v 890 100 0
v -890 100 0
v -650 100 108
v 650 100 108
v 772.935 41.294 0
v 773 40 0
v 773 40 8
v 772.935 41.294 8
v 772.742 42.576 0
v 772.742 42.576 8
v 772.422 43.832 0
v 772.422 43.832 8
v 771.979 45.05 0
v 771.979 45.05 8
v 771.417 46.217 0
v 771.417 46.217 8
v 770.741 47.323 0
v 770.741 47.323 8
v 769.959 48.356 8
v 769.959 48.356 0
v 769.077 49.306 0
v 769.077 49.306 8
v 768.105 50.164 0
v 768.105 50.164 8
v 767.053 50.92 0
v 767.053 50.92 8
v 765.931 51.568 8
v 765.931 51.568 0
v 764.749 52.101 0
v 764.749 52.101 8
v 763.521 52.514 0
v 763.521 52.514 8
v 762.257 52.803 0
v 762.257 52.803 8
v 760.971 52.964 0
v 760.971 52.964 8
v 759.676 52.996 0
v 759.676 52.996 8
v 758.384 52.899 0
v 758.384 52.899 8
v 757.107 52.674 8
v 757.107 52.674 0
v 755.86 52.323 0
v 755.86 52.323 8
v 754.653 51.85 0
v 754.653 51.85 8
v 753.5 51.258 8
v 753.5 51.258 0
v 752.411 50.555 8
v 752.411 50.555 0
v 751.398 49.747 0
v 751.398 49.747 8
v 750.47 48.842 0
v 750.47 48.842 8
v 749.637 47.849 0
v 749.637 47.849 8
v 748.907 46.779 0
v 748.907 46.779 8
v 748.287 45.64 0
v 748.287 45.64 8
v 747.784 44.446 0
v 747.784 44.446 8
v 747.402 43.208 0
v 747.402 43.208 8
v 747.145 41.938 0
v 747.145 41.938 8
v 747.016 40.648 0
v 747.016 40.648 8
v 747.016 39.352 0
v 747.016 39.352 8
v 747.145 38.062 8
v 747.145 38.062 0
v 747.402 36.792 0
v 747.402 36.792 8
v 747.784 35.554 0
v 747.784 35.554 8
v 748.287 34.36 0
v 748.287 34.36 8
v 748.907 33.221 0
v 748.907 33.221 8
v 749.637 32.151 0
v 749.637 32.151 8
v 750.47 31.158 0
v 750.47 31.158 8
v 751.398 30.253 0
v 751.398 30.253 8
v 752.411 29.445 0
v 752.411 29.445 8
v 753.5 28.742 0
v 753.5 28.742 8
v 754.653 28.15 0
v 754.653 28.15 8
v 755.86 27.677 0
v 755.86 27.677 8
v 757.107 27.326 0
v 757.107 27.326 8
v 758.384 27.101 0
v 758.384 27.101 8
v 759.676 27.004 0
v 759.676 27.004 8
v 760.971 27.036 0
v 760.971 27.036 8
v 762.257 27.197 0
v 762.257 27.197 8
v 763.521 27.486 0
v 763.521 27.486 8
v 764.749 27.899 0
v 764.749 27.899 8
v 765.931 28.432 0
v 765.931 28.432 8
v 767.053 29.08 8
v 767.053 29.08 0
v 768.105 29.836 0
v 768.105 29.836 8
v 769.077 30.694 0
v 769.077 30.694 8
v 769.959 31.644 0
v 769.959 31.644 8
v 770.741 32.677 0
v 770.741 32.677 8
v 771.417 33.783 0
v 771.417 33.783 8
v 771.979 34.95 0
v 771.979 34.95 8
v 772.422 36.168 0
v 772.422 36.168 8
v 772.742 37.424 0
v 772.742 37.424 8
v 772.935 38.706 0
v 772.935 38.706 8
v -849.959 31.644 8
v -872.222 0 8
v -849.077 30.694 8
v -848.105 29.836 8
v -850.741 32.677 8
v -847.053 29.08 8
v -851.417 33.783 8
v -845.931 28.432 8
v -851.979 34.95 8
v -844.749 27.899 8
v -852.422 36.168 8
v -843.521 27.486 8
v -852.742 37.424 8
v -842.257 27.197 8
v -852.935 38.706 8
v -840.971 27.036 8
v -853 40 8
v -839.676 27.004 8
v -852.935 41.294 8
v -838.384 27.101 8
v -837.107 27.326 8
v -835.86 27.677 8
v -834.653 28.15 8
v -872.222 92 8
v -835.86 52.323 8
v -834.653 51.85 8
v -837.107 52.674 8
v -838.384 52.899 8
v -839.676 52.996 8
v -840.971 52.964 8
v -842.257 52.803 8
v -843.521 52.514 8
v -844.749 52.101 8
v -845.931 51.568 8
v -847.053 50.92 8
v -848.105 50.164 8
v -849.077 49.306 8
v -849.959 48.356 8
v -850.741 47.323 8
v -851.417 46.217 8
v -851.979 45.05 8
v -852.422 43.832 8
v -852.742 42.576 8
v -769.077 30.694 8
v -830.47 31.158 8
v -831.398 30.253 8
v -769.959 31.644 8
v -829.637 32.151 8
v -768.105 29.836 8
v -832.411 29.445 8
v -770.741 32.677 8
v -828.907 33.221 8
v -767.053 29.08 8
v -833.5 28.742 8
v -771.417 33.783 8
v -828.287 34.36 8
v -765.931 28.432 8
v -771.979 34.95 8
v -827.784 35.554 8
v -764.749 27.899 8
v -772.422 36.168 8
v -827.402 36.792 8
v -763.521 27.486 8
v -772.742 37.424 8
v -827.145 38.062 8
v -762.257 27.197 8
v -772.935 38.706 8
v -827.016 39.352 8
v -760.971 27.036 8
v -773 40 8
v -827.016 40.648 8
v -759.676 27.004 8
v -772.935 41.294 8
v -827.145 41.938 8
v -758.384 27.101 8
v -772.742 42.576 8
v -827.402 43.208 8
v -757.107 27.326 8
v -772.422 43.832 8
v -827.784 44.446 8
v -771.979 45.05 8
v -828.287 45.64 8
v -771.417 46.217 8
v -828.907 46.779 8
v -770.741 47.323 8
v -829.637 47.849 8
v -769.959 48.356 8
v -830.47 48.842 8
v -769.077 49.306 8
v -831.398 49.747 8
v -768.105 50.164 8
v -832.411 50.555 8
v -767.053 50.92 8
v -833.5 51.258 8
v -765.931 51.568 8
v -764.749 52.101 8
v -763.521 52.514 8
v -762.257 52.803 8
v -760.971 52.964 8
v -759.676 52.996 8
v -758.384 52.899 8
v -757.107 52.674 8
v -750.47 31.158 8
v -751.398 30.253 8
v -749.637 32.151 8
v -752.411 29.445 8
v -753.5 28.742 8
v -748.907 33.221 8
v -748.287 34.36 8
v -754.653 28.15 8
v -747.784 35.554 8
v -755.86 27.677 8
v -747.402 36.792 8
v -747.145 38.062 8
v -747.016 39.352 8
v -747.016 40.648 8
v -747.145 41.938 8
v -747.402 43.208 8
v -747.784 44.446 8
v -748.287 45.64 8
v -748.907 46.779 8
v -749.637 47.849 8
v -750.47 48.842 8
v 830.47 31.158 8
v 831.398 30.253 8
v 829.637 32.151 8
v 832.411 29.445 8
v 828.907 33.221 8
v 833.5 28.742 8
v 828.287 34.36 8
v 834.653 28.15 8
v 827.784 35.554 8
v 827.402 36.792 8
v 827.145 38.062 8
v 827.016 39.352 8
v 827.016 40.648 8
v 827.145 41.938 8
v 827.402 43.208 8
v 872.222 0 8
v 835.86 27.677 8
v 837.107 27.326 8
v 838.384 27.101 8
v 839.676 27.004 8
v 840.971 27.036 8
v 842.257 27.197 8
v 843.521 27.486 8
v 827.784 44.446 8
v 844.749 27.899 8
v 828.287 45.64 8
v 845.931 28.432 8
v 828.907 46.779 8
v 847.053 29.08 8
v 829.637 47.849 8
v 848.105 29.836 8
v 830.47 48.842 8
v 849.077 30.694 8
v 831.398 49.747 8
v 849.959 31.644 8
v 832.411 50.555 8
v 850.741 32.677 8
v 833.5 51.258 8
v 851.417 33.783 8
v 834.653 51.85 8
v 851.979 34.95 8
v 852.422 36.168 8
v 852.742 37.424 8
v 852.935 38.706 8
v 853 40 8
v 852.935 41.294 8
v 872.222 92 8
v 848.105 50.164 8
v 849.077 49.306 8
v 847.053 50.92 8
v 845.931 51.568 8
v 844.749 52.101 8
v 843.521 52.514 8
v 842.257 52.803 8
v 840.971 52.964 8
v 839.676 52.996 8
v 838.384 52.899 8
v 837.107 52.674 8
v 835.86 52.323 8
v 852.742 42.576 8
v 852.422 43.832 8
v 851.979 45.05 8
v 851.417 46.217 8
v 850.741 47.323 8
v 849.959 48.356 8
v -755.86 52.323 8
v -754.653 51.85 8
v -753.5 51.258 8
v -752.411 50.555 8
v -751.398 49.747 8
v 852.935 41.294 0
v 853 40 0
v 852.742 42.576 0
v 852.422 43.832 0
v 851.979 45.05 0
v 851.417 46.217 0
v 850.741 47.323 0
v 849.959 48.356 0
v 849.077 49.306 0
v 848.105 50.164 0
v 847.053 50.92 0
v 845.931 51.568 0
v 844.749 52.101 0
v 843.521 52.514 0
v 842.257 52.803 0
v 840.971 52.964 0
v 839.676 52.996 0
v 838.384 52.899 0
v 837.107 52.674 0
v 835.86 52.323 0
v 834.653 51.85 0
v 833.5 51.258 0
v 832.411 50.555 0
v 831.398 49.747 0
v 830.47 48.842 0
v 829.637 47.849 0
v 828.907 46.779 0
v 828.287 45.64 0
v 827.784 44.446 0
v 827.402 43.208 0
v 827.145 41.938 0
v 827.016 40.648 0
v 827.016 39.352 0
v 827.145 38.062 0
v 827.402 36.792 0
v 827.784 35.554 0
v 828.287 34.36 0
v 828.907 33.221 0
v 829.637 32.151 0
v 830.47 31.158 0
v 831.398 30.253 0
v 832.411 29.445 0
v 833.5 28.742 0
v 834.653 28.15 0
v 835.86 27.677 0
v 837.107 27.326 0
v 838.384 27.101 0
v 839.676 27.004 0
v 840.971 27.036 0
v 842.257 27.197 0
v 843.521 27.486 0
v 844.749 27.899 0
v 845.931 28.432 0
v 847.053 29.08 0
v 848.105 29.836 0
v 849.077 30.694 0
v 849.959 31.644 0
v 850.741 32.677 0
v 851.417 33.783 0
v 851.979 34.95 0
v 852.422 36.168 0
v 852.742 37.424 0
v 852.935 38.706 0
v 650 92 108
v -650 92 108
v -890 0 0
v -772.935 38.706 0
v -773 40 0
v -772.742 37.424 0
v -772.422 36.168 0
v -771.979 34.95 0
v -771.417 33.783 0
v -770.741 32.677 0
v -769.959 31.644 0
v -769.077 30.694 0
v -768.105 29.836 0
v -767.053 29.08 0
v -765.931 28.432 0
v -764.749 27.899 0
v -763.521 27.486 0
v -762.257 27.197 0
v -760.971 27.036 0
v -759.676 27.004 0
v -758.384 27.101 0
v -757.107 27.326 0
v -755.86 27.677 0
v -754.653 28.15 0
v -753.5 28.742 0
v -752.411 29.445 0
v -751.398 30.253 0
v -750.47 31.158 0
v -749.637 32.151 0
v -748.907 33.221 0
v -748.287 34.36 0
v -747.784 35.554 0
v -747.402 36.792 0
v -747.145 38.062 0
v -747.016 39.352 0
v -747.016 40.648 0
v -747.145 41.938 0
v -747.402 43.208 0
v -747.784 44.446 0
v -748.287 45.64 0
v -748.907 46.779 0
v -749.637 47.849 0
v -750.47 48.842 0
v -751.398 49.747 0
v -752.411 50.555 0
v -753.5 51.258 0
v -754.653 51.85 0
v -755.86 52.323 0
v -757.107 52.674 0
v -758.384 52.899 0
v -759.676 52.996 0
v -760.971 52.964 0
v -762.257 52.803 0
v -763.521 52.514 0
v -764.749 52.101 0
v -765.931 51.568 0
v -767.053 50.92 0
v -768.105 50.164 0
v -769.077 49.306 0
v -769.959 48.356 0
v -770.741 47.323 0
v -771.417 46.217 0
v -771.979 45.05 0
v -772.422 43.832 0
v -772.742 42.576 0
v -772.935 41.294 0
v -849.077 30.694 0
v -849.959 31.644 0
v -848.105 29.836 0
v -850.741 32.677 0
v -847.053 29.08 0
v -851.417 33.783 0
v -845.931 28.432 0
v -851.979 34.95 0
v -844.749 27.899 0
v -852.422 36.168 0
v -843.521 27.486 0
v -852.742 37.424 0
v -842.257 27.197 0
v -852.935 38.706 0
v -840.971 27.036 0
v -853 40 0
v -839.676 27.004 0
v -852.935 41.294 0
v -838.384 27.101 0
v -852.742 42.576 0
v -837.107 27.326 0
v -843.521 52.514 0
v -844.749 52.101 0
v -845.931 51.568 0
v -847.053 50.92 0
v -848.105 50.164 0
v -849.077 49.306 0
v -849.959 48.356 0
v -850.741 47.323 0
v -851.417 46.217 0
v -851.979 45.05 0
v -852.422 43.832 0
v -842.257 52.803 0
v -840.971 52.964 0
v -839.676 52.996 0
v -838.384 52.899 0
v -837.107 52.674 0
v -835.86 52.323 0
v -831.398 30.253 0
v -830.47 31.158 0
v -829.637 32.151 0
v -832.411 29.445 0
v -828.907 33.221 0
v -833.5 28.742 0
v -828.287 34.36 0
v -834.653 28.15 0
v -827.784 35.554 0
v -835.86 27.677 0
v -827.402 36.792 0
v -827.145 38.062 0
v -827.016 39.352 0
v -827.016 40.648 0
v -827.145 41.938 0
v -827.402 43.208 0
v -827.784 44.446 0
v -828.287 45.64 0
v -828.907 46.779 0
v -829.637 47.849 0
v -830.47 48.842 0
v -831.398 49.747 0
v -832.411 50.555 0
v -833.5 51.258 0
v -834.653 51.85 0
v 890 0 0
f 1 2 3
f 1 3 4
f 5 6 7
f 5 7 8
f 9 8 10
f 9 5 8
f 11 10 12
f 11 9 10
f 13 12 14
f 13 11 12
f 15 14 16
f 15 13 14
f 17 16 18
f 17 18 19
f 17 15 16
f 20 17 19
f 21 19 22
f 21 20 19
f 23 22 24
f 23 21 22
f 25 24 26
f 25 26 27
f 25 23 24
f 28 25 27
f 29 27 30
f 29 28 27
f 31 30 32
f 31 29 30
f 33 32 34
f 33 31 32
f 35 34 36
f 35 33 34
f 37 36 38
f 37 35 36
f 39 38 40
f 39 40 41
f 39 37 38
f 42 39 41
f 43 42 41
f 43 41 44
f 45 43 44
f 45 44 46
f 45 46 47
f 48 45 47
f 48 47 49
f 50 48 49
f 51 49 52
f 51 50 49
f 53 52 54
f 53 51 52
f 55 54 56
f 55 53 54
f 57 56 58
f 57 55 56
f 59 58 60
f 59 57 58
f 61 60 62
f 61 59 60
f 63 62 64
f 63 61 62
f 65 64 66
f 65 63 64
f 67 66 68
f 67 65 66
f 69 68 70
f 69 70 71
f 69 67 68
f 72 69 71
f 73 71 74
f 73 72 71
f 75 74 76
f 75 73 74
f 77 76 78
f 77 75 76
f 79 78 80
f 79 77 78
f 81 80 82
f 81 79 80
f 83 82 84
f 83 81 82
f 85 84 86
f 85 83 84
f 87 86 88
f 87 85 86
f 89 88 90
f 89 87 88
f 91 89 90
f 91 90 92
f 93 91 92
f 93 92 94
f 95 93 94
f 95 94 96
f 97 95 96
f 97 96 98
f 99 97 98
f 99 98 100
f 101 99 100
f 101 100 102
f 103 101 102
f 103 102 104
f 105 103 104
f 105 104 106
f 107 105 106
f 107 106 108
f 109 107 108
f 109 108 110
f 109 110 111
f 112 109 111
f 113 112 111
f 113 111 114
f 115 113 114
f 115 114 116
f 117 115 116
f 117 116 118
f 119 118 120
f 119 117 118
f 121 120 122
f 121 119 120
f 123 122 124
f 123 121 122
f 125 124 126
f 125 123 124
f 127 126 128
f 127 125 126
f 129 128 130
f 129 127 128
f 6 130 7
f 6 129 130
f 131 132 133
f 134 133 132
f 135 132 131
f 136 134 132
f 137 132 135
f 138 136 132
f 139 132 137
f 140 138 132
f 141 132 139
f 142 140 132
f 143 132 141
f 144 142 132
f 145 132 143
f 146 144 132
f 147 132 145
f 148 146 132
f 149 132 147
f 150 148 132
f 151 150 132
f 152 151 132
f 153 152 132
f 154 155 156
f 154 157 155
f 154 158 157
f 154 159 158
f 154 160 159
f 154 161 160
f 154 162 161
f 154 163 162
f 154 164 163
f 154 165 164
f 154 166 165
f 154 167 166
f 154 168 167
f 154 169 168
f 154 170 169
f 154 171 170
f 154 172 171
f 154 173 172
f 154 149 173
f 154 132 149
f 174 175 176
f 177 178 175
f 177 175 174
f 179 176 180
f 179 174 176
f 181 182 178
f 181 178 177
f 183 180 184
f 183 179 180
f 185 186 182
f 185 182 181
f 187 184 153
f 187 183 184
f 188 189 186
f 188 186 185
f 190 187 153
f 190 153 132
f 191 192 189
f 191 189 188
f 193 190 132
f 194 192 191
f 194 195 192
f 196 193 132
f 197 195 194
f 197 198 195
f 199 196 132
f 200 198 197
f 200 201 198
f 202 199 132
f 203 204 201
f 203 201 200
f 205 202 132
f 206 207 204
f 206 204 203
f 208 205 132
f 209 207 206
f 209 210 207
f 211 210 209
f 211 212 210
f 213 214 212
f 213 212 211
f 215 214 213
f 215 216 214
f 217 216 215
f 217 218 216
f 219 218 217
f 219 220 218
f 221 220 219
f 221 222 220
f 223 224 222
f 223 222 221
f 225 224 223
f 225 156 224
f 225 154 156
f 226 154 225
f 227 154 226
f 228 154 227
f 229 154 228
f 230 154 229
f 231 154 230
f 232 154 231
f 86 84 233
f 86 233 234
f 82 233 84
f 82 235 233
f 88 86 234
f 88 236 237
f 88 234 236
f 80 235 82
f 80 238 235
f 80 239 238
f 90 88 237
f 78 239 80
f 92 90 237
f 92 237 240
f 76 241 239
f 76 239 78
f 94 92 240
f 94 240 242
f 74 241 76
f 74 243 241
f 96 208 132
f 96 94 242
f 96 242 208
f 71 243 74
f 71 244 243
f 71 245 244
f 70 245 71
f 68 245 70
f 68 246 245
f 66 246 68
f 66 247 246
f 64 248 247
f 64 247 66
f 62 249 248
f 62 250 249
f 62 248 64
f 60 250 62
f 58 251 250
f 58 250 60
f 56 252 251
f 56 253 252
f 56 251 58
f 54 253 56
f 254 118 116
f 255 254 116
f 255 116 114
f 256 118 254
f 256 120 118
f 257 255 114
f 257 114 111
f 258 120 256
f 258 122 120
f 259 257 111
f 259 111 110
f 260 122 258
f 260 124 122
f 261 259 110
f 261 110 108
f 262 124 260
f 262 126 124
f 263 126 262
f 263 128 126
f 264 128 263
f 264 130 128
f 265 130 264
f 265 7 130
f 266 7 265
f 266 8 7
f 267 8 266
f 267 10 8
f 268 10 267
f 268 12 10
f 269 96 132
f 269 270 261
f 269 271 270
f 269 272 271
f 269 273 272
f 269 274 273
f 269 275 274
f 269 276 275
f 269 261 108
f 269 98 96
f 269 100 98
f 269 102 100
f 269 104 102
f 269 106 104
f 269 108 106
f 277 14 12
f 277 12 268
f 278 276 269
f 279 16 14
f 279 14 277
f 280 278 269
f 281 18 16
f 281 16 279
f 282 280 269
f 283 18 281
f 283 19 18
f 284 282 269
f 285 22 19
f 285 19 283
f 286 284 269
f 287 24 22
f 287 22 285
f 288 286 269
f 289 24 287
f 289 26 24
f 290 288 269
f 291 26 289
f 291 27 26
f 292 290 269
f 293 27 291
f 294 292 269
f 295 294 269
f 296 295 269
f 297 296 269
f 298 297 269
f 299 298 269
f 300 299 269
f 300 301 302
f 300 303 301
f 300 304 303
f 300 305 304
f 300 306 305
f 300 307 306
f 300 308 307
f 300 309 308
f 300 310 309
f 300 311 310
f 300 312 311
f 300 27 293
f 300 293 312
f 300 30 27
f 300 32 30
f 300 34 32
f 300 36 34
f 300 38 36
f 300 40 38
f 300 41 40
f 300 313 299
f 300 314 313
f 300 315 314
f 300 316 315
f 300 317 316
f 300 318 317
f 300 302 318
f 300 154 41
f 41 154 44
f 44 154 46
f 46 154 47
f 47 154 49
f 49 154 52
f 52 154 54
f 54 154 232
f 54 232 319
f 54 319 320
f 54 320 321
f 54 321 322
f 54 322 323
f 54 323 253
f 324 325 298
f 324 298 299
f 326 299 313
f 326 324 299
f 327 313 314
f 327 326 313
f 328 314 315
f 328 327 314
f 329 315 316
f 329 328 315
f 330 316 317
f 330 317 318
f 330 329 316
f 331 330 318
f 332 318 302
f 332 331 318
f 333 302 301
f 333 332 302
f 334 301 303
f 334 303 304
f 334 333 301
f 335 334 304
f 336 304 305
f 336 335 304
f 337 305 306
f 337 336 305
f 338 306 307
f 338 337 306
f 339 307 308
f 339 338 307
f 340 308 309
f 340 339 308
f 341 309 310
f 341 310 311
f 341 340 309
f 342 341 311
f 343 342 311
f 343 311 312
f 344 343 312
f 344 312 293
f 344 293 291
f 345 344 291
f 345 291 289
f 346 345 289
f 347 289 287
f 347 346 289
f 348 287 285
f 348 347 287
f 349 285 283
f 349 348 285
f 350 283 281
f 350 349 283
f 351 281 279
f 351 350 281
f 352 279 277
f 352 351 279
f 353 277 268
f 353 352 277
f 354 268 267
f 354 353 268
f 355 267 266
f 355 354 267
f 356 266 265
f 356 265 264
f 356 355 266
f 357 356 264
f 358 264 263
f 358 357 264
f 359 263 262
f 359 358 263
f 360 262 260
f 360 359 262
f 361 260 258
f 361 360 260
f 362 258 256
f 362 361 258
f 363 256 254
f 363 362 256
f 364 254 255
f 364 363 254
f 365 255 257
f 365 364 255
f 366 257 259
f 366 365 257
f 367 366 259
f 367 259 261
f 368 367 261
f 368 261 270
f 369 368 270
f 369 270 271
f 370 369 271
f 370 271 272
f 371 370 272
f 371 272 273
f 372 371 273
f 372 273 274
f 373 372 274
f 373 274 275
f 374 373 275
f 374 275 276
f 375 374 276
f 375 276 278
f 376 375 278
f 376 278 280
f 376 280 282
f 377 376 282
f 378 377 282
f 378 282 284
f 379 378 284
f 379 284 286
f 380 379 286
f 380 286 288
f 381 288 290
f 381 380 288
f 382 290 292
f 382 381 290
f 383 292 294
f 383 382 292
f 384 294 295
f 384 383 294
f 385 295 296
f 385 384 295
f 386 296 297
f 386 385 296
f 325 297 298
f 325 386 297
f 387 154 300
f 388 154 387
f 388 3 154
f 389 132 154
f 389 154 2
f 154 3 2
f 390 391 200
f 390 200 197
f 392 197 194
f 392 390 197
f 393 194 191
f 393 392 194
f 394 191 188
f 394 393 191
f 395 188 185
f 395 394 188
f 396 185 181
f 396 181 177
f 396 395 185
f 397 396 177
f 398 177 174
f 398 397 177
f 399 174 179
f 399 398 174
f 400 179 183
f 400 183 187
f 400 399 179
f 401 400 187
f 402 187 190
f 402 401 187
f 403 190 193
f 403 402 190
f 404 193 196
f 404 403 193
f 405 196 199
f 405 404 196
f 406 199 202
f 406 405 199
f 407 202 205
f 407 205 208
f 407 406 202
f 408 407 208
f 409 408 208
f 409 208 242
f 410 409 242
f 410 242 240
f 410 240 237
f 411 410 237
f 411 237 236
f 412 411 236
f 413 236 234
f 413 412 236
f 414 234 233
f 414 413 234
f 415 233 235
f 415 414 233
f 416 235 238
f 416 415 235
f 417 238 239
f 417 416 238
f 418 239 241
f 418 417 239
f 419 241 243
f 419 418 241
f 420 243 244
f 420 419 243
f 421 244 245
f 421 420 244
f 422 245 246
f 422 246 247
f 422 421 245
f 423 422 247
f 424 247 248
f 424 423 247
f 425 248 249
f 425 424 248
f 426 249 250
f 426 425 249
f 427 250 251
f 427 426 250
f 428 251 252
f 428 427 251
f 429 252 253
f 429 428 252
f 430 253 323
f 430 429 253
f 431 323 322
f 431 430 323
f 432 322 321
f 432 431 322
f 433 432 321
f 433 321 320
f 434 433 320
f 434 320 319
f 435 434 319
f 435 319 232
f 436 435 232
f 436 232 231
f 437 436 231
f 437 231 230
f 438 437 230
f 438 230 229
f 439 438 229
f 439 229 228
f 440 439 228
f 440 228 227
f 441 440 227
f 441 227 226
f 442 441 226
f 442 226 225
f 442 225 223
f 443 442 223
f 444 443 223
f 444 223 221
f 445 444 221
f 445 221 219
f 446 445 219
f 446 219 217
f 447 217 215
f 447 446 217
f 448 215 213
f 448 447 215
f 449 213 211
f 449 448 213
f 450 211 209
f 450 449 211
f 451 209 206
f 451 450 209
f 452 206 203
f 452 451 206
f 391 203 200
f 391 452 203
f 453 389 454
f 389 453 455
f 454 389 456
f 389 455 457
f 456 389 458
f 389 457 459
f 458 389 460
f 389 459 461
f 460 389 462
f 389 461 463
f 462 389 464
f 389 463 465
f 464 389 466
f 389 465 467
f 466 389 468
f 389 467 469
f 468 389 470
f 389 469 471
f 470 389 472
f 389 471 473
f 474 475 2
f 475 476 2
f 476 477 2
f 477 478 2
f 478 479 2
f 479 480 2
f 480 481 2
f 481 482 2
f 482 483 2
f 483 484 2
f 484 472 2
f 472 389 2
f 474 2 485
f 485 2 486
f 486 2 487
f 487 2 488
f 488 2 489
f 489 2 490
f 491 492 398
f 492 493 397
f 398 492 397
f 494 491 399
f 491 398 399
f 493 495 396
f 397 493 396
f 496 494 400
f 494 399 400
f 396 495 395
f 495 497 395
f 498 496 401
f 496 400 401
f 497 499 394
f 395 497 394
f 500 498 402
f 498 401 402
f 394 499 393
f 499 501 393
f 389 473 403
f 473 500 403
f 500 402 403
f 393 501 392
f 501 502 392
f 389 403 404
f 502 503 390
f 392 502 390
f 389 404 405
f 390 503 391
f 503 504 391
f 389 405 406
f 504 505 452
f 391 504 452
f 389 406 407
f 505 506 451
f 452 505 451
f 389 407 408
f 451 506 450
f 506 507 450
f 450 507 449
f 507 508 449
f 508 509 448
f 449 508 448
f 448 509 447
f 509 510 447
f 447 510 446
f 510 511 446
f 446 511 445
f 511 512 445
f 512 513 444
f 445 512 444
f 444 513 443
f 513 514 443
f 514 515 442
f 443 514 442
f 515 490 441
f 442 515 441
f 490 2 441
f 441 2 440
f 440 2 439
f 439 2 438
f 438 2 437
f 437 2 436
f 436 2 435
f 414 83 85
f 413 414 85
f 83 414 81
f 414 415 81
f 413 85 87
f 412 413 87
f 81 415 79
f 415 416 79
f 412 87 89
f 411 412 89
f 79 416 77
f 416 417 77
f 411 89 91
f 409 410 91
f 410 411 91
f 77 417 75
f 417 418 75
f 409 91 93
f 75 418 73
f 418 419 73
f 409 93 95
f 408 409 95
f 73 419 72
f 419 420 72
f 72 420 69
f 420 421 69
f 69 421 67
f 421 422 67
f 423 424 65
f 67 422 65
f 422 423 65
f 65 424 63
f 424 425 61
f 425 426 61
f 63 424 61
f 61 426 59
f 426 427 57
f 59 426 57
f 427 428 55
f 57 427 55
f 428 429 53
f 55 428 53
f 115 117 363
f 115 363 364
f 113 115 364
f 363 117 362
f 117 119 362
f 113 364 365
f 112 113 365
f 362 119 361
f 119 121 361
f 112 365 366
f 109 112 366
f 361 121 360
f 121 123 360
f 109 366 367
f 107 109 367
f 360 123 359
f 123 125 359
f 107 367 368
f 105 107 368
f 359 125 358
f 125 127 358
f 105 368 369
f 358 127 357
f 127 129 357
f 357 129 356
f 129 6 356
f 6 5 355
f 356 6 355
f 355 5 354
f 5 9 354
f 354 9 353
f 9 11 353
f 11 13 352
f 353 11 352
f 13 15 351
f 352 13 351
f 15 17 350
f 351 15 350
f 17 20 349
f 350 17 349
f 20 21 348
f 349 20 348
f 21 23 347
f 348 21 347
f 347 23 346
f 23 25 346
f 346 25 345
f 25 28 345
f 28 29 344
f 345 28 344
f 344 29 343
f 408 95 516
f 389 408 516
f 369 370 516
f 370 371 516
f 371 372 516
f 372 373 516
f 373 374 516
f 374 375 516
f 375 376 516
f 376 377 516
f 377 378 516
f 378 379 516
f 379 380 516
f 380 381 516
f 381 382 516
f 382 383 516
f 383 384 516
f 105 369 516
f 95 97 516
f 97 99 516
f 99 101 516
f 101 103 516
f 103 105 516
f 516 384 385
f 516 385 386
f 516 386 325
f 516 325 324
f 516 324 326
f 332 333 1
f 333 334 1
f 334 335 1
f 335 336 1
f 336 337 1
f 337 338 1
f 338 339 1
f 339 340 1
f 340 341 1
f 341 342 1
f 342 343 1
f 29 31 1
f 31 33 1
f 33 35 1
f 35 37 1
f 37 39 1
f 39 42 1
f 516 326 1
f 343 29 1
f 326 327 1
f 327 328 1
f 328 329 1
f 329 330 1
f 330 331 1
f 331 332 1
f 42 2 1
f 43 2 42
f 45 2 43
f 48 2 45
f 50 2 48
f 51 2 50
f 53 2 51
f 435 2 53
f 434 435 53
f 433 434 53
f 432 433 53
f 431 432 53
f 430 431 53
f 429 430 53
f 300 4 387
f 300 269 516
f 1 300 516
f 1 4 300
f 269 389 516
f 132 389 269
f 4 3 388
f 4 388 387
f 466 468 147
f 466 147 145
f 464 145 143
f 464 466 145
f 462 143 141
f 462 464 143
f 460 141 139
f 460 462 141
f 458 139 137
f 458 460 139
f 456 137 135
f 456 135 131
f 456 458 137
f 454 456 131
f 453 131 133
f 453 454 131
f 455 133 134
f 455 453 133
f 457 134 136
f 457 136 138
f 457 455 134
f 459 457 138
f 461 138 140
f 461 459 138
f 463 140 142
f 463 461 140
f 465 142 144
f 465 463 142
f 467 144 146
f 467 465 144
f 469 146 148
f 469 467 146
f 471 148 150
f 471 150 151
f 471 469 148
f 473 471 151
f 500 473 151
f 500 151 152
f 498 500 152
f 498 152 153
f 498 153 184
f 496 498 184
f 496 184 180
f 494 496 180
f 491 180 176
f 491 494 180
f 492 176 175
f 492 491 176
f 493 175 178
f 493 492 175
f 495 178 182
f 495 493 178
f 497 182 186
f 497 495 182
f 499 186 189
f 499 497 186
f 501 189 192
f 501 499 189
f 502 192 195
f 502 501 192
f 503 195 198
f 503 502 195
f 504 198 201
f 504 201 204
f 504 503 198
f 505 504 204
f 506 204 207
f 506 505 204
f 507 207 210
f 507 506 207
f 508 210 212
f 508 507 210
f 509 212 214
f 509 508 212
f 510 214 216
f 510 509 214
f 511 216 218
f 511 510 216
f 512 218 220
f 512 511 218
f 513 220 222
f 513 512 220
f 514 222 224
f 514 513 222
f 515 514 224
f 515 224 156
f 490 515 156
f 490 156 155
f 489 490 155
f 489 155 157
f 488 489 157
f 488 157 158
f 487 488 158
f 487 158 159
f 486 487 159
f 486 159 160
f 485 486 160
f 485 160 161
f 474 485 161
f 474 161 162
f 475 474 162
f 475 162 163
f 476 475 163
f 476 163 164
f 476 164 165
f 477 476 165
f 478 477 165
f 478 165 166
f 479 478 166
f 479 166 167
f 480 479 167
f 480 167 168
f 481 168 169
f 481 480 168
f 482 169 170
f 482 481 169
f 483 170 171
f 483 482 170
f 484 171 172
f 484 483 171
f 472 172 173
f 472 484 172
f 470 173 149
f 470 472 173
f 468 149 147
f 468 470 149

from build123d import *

# Parameters (mm, degrees)
SKETCH_1_W          = 1780
SKETCH_1_H          = 100
SKETCH_1_R          = 13
EXTRUDE_573_DEPTH   = 8
SKETCH_2_W          = 1780
SKETCH_2_H          = 8
EXTRUDE_1_DEPTH     = 100
CUT_EXTRUDE_1_DEPTH = 903.088687436


with BuildPart() as part:
    # 草图1 → Extrude 573 (new body)
    with BuildSketch(Plane.XY):
        with Locations((0, 50)):
            Rectangle(SKETCH_1_W, SKETCH_1_H)
        with Locations((840, 40)):
            Circle(SKETCH_1_R, mode=Mode.SUBTRACT)
        with Locations((760, 40)):
            Circle(SKETCH_1_R, mode=Mode.SUBTRACT)
        with Locations(Location((-840, 40, 0), (0, 0, 180))):
            Circle(SKETCH_1_R, mode=Mode.SUBTRACT)
        with Locations(Location((-760, 40, 0), (0, 0, 180))):
            Circle(SKETCH_1_R, mode=Mode.SUBTRACT)
    extrude(amount=EXTRUDE_573_DEPTH)

    # 草图2 → 凸台-拉伸1 (add)
    with BuildSketch(Plane.XY.offset(8)):
        with Locations((0, 96)):
            Rectangle(SKETCH_2_W, SKETCH_2_H)
    extrude(amount=EXTRUDE_1_DEPTH)

    # 草图3 → 切除-拉伸1 (cut, through all)
    with BuildSketch(Plane(origin=(0, 100, 0), x_dir=(-1, 0, 0), z_dir=(0, 1, 0))):
        Polygon((-650, 108), (-890, 0), (-890, 108), align=None)
        Polygon((890, 108), (650, 108), (890, 0), align=None)
    extrude(amount=-CUT_EXTRUDE_1_DEPTH, mode=Mode.SUBTRACT)


solid = part.part
